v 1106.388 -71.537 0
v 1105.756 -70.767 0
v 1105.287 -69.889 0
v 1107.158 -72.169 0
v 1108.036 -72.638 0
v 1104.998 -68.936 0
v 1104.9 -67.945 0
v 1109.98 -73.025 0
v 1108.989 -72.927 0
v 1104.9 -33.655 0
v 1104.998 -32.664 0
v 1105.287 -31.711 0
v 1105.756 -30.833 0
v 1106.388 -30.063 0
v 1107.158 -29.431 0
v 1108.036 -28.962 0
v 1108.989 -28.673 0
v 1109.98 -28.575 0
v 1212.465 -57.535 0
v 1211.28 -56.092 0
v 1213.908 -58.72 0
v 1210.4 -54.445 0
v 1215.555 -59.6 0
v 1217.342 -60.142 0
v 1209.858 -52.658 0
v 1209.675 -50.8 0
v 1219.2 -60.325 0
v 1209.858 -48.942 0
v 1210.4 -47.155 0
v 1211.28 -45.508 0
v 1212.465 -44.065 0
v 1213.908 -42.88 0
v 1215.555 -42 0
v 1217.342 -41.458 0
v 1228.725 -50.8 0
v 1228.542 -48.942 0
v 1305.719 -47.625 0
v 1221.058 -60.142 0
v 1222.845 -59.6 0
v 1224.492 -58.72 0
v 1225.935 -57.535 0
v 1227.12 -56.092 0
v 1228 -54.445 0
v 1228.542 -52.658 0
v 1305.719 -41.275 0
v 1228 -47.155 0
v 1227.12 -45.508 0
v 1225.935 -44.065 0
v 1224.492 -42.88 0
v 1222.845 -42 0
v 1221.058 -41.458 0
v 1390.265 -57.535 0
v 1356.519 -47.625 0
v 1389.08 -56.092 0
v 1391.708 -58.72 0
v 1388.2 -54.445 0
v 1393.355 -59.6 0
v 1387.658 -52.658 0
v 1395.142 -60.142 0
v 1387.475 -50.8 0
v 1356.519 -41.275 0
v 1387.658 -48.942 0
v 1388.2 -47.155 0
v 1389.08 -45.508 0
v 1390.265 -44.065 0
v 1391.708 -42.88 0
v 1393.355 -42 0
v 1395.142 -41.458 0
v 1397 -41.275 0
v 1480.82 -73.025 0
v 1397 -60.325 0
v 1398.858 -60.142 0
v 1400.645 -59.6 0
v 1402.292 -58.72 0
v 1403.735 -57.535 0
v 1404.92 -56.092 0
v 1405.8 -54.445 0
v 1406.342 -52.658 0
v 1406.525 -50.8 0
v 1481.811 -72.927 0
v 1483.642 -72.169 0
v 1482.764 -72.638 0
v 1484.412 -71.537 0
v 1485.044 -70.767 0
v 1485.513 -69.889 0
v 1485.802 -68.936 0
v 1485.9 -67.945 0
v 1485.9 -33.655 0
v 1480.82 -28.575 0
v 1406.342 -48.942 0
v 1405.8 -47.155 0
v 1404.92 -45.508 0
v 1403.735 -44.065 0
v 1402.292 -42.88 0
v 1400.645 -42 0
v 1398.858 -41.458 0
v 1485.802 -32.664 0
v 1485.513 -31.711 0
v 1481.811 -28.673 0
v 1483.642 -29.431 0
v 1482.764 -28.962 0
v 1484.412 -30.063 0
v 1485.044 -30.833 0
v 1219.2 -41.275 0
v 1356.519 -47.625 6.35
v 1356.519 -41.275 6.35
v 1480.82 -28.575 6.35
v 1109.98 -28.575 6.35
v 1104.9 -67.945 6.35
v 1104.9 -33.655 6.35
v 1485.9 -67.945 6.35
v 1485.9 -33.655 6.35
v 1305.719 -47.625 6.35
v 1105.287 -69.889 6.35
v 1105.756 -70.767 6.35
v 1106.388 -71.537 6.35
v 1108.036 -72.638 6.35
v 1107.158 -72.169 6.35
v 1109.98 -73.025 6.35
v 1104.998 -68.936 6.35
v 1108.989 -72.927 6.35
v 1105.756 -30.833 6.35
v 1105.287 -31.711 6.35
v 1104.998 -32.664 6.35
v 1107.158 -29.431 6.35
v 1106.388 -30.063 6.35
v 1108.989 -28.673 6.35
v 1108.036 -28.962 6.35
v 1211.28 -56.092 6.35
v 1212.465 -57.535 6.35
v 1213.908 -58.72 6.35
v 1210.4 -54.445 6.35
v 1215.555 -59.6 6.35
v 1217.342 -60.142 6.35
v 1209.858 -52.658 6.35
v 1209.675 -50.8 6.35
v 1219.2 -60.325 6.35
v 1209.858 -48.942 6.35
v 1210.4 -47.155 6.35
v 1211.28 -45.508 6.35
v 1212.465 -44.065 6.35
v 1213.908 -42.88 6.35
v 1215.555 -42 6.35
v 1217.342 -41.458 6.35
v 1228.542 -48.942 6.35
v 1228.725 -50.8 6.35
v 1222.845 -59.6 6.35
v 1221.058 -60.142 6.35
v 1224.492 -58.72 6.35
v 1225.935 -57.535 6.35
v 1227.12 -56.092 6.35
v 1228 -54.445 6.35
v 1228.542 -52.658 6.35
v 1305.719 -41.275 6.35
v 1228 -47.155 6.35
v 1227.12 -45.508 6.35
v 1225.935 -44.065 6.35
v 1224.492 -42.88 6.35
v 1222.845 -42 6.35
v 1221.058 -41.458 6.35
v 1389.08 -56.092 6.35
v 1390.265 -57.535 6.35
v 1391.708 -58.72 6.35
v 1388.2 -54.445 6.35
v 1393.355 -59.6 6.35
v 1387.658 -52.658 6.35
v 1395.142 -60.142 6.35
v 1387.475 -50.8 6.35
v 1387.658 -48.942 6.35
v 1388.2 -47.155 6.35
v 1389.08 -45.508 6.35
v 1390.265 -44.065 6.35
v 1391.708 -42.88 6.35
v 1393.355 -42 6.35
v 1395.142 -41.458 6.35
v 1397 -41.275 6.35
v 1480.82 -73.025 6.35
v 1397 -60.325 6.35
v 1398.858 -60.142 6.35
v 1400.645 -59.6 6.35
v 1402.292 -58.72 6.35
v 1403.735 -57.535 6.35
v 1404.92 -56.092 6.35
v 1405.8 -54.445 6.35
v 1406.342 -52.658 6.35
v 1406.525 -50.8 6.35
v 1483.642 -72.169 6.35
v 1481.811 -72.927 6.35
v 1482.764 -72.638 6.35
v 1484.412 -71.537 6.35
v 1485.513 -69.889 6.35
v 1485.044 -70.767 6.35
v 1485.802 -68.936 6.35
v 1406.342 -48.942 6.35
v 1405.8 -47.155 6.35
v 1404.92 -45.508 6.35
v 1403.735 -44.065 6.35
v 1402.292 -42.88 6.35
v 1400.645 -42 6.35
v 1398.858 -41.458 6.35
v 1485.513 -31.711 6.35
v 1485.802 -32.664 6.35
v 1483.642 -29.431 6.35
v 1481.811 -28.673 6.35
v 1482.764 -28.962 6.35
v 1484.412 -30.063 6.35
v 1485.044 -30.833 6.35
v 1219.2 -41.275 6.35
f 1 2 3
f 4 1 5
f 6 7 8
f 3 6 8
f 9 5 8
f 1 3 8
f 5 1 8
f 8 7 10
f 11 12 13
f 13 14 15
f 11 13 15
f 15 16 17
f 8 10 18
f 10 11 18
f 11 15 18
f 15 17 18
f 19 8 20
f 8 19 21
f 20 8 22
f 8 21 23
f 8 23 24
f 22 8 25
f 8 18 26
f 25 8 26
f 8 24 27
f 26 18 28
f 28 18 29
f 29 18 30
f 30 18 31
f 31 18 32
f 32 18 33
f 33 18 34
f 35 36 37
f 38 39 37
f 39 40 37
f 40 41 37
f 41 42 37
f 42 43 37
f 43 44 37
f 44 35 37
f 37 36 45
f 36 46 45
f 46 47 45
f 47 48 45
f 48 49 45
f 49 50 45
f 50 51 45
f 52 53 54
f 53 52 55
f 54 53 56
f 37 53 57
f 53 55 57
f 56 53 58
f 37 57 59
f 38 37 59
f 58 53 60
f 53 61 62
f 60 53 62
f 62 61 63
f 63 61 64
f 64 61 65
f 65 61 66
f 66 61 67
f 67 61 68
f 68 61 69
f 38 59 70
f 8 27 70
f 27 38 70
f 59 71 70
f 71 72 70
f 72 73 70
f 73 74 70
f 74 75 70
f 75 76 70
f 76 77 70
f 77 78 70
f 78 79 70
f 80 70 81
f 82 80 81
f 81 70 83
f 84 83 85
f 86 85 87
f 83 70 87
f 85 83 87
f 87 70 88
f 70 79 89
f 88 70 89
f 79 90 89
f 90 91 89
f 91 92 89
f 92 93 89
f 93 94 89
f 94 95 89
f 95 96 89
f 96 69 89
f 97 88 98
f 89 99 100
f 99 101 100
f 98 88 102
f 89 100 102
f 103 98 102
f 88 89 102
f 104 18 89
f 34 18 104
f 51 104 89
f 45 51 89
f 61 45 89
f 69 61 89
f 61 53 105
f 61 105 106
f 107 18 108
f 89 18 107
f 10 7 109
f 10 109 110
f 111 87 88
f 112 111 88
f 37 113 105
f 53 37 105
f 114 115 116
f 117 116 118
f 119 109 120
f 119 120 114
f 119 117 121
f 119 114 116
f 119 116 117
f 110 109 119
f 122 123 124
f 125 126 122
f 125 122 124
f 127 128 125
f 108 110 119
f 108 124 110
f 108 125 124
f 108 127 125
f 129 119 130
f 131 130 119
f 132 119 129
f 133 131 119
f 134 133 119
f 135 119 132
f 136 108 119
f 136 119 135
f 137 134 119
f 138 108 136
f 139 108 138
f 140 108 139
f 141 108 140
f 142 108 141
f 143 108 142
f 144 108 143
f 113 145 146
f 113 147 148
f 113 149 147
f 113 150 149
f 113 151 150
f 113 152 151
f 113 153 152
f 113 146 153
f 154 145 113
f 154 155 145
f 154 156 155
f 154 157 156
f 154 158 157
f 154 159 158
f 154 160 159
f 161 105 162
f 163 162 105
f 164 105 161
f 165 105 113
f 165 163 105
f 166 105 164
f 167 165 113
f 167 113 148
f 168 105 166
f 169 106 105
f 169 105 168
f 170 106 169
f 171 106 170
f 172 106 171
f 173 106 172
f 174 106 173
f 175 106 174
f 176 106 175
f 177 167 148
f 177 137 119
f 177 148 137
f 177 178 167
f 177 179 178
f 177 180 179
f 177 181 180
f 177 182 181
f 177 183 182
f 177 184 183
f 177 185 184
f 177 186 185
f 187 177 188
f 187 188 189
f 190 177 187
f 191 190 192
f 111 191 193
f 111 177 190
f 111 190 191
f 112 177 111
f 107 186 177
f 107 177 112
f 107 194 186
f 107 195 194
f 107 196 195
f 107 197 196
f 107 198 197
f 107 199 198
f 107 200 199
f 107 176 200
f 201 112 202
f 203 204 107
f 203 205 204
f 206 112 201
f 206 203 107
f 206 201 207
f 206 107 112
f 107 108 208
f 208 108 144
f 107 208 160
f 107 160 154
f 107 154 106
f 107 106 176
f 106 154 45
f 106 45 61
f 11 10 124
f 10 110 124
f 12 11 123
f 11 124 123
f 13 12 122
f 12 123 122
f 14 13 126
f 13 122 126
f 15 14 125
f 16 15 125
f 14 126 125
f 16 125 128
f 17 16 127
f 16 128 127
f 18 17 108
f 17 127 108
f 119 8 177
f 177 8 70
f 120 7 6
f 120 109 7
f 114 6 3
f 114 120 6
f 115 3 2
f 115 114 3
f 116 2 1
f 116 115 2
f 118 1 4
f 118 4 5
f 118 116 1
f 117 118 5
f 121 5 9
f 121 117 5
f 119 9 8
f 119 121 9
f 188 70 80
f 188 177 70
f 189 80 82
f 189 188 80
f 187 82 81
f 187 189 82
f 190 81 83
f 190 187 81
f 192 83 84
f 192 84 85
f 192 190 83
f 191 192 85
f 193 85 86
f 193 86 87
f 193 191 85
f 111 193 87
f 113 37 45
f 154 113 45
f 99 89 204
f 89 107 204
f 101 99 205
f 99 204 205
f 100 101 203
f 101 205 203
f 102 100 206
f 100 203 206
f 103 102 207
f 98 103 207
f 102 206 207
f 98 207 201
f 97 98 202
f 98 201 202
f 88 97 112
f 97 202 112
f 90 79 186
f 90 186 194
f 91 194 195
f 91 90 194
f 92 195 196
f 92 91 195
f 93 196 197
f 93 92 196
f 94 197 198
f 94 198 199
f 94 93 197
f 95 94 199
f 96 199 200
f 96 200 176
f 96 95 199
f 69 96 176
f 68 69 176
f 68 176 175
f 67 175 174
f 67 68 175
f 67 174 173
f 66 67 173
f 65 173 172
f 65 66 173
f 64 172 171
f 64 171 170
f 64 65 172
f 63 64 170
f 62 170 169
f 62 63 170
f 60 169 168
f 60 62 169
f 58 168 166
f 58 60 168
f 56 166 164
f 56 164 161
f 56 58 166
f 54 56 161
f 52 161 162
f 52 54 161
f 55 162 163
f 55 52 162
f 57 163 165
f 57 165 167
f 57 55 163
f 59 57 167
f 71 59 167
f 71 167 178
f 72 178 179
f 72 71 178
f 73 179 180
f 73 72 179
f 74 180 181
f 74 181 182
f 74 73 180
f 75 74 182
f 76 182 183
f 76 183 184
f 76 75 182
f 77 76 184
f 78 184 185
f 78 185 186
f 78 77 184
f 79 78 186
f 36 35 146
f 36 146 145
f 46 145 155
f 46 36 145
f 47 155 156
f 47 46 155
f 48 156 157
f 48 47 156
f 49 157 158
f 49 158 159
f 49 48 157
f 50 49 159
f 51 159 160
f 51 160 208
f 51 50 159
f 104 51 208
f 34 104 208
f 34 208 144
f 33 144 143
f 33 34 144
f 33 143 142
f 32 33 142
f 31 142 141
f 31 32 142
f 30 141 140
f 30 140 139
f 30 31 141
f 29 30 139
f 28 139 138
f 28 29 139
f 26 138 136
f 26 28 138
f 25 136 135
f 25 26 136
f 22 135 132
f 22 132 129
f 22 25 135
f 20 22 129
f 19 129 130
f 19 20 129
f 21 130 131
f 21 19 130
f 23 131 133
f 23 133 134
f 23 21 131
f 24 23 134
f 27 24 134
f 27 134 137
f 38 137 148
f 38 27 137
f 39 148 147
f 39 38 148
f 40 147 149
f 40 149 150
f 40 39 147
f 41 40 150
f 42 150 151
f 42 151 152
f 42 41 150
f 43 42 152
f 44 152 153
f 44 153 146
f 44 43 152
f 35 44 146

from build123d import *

# Parameters (mm, degrees)
SKETCH1_W           = 381
SKETCH1_H           = 44.45
SKETCH1_R           = 9.525
BOSS_EXTRUDE1_DEPTH = 6.35
FILLET1_R           = 5.08
SKETCH2_W           = 50.8
SKETCH2_H           = 6.35
CUT_EXTRUDE1_DEPTH  = 7.35


with BuildPart() as part:
    # Sketch1 → Boss-Extrude1 (new body)
    with BuildSketch(Plane.XY):
        with Locations((1295.4, -50.8)):
            Rectangle(SKETCH1_W, SKETCH1_H)
        with Locations((1219.2, -50.8)):
            Circle(SKETCH1_R, mode=Mode.SUBTRACT)
        with Locations((1397, -50.8)):
            Circle(SKETCH1_R, mode=Mode.SUBTRACT)
    extrude(amount=BOSS_EXTRUDE1_DEPTH)

    # Fillet1
    fillet1_edges = [part.edges().sort_by_distance(p)[0] for p in [
        (1104.9, -28.575, 3.175),
        (1485.9, -28.575, 3.175),
        (1485.9, -73.025, 3.175),
        (1104.9, -73.025, 3.175),
    ]]
    fillet(fillet1_edges, radius=FILLET1_R)

    # Sketch2 → Cut-Extrude1 (cut, through all)
    with BuildSketch(Plane.XY.offset(6.35)):
        with Locations((1331.11875, -44.45)):
            Rectangle(SKETCH2_W, SKETCH2_H)
    extrude(amount=-CUT_EXTRUDE1_DEPTH, mode=Mode.SUBTRACT)


solid = part.part
